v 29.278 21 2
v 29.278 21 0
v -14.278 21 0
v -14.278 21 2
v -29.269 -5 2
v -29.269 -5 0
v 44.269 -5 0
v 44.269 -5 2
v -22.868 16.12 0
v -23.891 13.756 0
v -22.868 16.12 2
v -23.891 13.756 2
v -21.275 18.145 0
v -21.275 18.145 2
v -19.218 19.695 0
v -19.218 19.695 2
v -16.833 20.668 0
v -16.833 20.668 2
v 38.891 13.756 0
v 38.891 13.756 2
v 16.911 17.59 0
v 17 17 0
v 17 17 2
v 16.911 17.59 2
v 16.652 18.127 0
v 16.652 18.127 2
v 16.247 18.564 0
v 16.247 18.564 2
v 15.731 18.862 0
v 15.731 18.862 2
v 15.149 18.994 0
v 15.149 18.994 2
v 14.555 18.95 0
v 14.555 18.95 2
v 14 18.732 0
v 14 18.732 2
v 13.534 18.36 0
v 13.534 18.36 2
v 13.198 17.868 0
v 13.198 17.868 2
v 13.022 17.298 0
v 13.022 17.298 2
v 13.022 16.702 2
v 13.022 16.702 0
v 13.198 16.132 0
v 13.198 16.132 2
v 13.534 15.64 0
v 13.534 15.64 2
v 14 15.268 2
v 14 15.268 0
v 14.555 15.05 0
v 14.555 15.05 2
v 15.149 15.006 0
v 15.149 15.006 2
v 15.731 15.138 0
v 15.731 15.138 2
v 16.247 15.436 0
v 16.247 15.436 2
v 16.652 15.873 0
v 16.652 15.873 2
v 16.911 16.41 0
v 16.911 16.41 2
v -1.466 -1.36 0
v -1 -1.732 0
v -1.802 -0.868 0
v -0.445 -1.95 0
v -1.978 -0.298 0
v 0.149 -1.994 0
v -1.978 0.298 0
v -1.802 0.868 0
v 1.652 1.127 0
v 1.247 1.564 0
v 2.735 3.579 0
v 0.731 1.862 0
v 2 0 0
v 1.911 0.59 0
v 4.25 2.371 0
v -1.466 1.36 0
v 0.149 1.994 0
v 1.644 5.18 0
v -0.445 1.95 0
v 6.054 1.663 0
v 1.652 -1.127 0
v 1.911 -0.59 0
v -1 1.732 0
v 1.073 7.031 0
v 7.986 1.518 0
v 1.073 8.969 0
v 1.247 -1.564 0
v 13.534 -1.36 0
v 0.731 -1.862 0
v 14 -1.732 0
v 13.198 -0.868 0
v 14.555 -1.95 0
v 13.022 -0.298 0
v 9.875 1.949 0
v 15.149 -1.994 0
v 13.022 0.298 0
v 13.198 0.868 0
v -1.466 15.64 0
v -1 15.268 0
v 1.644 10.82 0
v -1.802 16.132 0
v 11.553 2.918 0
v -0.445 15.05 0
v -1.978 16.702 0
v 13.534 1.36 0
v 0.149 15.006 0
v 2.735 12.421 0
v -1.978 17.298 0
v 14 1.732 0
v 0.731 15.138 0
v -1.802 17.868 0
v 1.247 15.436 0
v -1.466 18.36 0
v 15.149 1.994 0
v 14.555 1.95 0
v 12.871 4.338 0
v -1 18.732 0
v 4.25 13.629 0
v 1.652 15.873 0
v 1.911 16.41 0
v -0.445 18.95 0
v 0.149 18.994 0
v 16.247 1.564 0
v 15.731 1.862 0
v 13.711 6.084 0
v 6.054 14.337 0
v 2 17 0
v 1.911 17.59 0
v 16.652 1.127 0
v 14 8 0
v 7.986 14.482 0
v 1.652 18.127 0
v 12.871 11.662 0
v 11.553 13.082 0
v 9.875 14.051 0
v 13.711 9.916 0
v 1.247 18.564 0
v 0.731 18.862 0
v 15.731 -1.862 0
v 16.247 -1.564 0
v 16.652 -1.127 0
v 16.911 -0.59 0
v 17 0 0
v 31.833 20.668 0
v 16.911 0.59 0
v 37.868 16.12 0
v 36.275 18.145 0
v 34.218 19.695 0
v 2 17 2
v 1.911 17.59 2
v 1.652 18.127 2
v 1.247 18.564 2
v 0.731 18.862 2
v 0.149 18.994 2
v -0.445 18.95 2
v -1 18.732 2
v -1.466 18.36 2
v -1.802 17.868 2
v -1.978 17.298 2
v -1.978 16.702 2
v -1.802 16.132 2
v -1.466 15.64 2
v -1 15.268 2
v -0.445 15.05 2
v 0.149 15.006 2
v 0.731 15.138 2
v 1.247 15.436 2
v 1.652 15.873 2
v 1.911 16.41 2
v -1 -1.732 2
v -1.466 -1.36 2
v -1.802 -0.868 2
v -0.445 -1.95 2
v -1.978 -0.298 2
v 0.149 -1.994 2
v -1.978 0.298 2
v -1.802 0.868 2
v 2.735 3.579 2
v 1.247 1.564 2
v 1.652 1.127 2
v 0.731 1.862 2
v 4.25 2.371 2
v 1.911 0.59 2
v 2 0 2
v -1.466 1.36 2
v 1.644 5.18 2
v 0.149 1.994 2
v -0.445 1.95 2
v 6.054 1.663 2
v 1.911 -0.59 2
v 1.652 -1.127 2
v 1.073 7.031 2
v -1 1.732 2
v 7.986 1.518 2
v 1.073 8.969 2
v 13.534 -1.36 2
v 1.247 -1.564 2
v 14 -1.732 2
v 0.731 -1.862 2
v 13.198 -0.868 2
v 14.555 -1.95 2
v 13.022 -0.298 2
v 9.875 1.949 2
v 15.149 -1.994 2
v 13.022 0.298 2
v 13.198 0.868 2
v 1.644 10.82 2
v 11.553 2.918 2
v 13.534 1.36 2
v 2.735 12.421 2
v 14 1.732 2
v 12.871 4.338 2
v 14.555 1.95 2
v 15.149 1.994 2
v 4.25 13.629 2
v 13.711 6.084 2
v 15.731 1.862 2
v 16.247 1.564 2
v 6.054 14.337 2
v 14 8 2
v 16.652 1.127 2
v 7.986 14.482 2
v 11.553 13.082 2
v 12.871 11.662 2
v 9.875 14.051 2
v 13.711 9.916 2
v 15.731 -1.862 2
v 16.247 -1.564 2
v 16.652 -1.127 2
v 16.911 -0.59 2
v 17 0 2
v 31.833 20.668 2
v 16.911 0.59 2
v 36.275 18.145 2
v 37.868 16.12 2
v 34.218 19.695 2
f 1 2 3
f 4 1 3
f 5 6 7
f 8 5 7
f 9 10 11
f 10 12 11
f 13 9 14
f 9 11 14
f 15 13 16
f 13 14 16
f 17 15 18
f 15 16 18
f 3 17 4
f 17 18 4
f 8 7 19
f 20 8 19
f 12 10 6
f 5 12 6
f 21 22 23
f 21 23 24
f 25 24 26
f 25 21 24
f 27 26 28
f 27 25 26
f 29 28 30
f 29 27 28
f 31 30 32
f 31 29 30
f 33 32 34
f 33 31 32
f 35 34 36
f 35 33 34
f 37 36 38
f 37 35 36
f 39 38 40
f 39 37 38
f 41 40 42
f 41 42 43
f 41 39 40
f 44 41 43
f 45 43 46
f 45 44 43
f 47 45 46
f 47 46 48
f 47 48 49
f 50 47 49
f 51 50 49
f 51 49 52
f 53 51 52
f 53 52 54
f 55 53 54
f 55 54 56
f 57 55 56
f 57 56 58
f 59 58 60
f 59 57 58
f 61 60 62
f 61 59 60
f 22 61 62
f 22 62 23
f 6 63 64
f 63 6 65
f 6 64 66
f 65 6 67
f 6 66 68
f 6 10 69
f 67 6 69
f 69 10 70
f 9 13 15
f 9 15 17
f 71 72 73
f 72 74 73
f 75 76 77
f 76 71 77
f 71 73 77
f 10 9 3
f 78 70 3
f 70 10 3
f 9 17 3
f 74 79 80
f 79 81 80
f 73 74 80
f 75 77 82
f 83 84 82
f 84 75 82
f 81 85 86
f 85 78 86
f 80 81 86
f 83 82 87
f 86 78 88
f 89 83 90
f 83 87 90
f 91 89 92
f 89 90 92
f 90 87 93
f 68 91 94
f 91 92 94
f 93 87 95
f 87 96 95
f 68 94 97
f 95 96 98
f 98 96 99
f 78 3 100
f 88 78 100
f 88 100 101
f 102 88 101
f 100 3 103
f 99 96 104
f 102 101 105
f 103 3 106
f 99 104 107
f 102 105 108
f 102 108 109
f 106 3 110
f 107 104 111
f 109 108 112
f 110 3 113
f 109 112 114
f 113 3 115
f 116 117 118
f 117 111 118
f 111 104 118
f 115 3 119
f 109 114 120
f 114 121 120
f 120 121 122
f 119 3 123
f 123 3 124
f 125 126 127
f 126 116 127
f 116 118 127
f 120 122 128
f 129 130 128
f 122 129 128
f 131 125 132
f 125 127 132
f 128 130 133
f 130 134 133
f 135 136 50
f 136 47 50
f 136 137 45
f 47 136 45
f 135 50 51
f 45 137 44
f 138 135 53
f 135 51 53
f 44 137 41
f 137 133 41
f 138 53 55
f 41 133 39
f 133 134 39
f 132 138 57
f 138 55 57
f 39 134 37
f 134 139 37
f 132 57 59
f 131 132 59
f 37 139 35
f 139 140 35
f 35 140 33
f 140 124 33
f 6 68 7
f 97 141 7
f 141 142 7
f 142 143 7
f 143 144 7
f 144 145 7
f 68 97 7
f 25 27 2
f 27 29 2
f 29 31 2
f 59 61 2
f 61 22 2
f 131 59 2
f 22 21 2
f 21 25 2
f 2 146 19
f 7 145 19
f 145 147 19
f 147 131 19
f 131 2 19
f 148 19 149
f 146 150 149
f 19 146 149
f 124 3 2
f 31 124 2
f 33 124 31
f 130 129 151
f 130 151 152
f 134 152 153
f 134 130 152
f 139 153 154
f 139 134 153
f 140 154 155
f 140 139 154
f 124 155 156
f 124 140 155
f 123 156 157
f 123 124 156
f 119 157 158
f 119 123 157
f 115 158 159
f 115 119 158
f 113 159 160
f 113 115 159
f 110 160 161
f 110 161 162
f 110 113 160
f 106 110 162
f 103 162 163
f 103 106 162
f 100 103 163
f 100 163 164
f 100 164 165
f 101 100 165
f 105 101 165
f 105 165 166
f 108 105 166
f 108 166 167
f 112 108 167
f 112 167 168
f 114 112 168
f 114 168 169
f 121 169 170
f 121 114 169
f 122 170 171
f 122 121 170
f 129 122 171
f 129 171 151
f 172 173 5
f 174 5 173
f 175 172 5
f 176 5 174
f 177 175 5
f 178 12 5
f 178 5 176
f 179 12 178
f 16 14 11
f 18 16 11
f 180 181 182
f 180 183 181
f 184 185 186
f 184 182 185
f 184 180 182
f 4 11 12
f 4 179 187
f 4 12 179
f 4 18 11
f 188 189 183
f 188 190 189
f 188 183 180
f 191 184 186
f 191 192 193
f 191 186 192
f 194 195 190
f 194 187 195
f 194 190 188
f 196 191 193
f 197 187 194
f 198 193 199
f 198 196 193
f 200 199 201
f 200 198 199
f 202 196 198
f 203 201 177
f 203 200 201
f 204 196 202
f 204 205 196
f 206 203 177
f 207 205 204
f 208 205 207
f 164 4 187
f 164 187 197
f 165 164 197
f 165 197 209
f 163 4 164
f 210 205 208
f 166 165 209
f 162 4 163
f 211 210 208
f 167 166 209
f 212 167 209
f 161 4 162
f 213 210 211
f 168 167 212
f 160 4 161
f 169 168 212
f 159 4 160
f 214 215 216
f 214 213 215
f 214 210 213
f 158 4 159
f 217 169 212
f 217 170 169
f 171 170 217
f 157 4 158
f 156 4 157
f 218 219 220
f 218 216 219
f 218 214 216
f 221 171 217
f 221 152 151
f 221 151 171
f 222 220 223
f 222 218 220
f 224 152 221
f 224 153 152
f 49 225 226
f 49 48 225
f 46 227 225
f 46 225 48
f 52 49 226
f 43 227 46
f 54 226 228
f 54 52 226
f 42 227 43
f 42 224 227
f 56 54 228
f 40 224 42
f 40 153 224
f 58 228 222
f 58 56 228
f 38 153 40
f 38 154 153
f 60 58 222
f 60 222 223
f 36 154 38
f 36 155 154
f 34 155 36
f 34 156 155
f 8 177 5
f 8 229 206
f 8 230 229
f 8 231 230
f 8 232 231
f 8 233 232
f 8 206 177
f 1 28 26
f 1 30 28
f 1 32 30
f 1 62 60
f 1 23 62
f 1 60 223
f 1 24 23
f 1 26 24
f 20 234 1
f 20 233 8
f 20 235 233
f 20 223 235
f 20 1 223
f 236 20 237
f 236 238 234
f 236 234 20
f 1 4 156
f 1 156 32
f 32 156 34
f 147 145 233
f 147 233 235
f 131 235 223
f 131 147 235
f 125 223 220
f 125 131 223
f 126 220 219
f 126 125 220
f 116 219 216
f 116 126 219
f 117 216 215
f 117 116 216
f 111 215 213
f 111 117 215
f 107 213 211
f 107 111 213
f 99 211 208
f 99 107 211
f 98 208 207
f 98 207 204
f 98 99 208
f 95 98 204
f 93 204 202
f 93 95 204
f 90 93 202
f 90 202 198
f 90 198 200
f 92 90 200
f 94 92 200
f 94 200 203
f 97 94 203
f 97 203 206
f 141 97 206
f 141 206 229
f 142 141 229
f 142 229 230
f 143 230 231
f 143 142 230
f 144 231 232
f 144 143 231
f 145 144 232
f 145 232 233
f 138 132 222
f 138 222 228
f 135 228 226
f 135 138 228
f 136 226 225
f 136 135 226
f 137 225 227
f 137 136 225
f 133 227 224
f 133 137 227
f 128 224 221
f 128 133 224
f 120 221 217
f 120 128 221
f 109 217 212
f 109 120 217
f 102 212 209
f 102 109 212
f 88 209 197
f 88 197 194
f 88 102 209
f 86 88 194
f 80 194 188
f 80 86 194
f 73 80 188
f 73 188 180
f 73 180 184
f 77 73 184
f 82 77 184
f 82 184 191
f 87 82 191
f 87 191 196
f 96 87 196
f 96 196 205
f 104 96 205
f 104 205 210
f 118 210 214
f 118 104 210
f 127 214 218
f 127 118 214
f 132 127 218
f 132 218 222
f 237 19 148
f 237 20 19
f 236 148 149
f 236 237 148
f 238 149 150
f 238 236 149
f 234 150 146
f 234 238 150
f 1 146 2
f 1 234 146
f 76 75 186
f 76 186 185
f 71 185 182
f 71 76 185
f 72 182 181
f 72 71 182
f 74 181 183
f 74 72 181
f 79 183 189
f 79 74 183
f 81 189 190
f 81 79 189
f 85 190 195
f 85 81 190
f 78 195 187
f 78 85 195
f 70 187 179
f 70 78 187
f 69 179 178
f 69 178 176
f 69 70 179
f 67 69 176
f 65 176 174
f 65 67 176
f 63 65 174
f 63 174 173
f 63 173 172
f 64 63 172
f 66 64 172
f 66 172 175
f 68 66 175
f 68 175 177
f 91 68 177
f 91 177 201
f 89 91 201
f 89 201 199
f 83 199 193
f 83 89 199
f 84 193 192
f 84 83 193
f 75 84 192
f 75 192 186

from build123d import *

# Parameters (mm, degrees)
SKETCH_1_R      = 2
SKETCH_1_R_2    = 6.5
EXTRUDE_1_DEPTH = 2
FILLET_1_R      = 10


with BuildPart() as part:
    # 草图1 → 凸台-拉伸1 (new body)
    with BuildSketch(Plane.XY):
        Polygon((-29.269334238, -5), (44.269334238, -5), (36.813954208, 21), (-21.813954208, 21), align=None)
        with Locations((15, 17)):
            Circle(SKETCH_1_R, mode=Mode.SUBTRACT)
        with Locations((15, 0)):
            Circle(SKETCH_1_R, mode=Mode.SUBTRACT)
        Circle(SKETCH_1_R, mode=Mode.SUBTRACT)
        with Locations((0, 17)):
            Circle(SKETCH_1_R, mode=Mode.SUBTRACT)
        with Locations((7.5, 8)):
            Circle(SKETCH_1_R_2, mode=Mode.SUBTRACT)
    extrude(amount=EXTRUDE_1_DEPTH)

    # 圆角1
    fillet_1_edges = [part.edges().sort_by_distance(p)[0] for p in [
        (-21.813954208, 21, 1),
        (36.813954208, 21, 1),
    ]]
    fillet(fillet_1_edges, radius=FILLET_1_R)


solid = part.part
